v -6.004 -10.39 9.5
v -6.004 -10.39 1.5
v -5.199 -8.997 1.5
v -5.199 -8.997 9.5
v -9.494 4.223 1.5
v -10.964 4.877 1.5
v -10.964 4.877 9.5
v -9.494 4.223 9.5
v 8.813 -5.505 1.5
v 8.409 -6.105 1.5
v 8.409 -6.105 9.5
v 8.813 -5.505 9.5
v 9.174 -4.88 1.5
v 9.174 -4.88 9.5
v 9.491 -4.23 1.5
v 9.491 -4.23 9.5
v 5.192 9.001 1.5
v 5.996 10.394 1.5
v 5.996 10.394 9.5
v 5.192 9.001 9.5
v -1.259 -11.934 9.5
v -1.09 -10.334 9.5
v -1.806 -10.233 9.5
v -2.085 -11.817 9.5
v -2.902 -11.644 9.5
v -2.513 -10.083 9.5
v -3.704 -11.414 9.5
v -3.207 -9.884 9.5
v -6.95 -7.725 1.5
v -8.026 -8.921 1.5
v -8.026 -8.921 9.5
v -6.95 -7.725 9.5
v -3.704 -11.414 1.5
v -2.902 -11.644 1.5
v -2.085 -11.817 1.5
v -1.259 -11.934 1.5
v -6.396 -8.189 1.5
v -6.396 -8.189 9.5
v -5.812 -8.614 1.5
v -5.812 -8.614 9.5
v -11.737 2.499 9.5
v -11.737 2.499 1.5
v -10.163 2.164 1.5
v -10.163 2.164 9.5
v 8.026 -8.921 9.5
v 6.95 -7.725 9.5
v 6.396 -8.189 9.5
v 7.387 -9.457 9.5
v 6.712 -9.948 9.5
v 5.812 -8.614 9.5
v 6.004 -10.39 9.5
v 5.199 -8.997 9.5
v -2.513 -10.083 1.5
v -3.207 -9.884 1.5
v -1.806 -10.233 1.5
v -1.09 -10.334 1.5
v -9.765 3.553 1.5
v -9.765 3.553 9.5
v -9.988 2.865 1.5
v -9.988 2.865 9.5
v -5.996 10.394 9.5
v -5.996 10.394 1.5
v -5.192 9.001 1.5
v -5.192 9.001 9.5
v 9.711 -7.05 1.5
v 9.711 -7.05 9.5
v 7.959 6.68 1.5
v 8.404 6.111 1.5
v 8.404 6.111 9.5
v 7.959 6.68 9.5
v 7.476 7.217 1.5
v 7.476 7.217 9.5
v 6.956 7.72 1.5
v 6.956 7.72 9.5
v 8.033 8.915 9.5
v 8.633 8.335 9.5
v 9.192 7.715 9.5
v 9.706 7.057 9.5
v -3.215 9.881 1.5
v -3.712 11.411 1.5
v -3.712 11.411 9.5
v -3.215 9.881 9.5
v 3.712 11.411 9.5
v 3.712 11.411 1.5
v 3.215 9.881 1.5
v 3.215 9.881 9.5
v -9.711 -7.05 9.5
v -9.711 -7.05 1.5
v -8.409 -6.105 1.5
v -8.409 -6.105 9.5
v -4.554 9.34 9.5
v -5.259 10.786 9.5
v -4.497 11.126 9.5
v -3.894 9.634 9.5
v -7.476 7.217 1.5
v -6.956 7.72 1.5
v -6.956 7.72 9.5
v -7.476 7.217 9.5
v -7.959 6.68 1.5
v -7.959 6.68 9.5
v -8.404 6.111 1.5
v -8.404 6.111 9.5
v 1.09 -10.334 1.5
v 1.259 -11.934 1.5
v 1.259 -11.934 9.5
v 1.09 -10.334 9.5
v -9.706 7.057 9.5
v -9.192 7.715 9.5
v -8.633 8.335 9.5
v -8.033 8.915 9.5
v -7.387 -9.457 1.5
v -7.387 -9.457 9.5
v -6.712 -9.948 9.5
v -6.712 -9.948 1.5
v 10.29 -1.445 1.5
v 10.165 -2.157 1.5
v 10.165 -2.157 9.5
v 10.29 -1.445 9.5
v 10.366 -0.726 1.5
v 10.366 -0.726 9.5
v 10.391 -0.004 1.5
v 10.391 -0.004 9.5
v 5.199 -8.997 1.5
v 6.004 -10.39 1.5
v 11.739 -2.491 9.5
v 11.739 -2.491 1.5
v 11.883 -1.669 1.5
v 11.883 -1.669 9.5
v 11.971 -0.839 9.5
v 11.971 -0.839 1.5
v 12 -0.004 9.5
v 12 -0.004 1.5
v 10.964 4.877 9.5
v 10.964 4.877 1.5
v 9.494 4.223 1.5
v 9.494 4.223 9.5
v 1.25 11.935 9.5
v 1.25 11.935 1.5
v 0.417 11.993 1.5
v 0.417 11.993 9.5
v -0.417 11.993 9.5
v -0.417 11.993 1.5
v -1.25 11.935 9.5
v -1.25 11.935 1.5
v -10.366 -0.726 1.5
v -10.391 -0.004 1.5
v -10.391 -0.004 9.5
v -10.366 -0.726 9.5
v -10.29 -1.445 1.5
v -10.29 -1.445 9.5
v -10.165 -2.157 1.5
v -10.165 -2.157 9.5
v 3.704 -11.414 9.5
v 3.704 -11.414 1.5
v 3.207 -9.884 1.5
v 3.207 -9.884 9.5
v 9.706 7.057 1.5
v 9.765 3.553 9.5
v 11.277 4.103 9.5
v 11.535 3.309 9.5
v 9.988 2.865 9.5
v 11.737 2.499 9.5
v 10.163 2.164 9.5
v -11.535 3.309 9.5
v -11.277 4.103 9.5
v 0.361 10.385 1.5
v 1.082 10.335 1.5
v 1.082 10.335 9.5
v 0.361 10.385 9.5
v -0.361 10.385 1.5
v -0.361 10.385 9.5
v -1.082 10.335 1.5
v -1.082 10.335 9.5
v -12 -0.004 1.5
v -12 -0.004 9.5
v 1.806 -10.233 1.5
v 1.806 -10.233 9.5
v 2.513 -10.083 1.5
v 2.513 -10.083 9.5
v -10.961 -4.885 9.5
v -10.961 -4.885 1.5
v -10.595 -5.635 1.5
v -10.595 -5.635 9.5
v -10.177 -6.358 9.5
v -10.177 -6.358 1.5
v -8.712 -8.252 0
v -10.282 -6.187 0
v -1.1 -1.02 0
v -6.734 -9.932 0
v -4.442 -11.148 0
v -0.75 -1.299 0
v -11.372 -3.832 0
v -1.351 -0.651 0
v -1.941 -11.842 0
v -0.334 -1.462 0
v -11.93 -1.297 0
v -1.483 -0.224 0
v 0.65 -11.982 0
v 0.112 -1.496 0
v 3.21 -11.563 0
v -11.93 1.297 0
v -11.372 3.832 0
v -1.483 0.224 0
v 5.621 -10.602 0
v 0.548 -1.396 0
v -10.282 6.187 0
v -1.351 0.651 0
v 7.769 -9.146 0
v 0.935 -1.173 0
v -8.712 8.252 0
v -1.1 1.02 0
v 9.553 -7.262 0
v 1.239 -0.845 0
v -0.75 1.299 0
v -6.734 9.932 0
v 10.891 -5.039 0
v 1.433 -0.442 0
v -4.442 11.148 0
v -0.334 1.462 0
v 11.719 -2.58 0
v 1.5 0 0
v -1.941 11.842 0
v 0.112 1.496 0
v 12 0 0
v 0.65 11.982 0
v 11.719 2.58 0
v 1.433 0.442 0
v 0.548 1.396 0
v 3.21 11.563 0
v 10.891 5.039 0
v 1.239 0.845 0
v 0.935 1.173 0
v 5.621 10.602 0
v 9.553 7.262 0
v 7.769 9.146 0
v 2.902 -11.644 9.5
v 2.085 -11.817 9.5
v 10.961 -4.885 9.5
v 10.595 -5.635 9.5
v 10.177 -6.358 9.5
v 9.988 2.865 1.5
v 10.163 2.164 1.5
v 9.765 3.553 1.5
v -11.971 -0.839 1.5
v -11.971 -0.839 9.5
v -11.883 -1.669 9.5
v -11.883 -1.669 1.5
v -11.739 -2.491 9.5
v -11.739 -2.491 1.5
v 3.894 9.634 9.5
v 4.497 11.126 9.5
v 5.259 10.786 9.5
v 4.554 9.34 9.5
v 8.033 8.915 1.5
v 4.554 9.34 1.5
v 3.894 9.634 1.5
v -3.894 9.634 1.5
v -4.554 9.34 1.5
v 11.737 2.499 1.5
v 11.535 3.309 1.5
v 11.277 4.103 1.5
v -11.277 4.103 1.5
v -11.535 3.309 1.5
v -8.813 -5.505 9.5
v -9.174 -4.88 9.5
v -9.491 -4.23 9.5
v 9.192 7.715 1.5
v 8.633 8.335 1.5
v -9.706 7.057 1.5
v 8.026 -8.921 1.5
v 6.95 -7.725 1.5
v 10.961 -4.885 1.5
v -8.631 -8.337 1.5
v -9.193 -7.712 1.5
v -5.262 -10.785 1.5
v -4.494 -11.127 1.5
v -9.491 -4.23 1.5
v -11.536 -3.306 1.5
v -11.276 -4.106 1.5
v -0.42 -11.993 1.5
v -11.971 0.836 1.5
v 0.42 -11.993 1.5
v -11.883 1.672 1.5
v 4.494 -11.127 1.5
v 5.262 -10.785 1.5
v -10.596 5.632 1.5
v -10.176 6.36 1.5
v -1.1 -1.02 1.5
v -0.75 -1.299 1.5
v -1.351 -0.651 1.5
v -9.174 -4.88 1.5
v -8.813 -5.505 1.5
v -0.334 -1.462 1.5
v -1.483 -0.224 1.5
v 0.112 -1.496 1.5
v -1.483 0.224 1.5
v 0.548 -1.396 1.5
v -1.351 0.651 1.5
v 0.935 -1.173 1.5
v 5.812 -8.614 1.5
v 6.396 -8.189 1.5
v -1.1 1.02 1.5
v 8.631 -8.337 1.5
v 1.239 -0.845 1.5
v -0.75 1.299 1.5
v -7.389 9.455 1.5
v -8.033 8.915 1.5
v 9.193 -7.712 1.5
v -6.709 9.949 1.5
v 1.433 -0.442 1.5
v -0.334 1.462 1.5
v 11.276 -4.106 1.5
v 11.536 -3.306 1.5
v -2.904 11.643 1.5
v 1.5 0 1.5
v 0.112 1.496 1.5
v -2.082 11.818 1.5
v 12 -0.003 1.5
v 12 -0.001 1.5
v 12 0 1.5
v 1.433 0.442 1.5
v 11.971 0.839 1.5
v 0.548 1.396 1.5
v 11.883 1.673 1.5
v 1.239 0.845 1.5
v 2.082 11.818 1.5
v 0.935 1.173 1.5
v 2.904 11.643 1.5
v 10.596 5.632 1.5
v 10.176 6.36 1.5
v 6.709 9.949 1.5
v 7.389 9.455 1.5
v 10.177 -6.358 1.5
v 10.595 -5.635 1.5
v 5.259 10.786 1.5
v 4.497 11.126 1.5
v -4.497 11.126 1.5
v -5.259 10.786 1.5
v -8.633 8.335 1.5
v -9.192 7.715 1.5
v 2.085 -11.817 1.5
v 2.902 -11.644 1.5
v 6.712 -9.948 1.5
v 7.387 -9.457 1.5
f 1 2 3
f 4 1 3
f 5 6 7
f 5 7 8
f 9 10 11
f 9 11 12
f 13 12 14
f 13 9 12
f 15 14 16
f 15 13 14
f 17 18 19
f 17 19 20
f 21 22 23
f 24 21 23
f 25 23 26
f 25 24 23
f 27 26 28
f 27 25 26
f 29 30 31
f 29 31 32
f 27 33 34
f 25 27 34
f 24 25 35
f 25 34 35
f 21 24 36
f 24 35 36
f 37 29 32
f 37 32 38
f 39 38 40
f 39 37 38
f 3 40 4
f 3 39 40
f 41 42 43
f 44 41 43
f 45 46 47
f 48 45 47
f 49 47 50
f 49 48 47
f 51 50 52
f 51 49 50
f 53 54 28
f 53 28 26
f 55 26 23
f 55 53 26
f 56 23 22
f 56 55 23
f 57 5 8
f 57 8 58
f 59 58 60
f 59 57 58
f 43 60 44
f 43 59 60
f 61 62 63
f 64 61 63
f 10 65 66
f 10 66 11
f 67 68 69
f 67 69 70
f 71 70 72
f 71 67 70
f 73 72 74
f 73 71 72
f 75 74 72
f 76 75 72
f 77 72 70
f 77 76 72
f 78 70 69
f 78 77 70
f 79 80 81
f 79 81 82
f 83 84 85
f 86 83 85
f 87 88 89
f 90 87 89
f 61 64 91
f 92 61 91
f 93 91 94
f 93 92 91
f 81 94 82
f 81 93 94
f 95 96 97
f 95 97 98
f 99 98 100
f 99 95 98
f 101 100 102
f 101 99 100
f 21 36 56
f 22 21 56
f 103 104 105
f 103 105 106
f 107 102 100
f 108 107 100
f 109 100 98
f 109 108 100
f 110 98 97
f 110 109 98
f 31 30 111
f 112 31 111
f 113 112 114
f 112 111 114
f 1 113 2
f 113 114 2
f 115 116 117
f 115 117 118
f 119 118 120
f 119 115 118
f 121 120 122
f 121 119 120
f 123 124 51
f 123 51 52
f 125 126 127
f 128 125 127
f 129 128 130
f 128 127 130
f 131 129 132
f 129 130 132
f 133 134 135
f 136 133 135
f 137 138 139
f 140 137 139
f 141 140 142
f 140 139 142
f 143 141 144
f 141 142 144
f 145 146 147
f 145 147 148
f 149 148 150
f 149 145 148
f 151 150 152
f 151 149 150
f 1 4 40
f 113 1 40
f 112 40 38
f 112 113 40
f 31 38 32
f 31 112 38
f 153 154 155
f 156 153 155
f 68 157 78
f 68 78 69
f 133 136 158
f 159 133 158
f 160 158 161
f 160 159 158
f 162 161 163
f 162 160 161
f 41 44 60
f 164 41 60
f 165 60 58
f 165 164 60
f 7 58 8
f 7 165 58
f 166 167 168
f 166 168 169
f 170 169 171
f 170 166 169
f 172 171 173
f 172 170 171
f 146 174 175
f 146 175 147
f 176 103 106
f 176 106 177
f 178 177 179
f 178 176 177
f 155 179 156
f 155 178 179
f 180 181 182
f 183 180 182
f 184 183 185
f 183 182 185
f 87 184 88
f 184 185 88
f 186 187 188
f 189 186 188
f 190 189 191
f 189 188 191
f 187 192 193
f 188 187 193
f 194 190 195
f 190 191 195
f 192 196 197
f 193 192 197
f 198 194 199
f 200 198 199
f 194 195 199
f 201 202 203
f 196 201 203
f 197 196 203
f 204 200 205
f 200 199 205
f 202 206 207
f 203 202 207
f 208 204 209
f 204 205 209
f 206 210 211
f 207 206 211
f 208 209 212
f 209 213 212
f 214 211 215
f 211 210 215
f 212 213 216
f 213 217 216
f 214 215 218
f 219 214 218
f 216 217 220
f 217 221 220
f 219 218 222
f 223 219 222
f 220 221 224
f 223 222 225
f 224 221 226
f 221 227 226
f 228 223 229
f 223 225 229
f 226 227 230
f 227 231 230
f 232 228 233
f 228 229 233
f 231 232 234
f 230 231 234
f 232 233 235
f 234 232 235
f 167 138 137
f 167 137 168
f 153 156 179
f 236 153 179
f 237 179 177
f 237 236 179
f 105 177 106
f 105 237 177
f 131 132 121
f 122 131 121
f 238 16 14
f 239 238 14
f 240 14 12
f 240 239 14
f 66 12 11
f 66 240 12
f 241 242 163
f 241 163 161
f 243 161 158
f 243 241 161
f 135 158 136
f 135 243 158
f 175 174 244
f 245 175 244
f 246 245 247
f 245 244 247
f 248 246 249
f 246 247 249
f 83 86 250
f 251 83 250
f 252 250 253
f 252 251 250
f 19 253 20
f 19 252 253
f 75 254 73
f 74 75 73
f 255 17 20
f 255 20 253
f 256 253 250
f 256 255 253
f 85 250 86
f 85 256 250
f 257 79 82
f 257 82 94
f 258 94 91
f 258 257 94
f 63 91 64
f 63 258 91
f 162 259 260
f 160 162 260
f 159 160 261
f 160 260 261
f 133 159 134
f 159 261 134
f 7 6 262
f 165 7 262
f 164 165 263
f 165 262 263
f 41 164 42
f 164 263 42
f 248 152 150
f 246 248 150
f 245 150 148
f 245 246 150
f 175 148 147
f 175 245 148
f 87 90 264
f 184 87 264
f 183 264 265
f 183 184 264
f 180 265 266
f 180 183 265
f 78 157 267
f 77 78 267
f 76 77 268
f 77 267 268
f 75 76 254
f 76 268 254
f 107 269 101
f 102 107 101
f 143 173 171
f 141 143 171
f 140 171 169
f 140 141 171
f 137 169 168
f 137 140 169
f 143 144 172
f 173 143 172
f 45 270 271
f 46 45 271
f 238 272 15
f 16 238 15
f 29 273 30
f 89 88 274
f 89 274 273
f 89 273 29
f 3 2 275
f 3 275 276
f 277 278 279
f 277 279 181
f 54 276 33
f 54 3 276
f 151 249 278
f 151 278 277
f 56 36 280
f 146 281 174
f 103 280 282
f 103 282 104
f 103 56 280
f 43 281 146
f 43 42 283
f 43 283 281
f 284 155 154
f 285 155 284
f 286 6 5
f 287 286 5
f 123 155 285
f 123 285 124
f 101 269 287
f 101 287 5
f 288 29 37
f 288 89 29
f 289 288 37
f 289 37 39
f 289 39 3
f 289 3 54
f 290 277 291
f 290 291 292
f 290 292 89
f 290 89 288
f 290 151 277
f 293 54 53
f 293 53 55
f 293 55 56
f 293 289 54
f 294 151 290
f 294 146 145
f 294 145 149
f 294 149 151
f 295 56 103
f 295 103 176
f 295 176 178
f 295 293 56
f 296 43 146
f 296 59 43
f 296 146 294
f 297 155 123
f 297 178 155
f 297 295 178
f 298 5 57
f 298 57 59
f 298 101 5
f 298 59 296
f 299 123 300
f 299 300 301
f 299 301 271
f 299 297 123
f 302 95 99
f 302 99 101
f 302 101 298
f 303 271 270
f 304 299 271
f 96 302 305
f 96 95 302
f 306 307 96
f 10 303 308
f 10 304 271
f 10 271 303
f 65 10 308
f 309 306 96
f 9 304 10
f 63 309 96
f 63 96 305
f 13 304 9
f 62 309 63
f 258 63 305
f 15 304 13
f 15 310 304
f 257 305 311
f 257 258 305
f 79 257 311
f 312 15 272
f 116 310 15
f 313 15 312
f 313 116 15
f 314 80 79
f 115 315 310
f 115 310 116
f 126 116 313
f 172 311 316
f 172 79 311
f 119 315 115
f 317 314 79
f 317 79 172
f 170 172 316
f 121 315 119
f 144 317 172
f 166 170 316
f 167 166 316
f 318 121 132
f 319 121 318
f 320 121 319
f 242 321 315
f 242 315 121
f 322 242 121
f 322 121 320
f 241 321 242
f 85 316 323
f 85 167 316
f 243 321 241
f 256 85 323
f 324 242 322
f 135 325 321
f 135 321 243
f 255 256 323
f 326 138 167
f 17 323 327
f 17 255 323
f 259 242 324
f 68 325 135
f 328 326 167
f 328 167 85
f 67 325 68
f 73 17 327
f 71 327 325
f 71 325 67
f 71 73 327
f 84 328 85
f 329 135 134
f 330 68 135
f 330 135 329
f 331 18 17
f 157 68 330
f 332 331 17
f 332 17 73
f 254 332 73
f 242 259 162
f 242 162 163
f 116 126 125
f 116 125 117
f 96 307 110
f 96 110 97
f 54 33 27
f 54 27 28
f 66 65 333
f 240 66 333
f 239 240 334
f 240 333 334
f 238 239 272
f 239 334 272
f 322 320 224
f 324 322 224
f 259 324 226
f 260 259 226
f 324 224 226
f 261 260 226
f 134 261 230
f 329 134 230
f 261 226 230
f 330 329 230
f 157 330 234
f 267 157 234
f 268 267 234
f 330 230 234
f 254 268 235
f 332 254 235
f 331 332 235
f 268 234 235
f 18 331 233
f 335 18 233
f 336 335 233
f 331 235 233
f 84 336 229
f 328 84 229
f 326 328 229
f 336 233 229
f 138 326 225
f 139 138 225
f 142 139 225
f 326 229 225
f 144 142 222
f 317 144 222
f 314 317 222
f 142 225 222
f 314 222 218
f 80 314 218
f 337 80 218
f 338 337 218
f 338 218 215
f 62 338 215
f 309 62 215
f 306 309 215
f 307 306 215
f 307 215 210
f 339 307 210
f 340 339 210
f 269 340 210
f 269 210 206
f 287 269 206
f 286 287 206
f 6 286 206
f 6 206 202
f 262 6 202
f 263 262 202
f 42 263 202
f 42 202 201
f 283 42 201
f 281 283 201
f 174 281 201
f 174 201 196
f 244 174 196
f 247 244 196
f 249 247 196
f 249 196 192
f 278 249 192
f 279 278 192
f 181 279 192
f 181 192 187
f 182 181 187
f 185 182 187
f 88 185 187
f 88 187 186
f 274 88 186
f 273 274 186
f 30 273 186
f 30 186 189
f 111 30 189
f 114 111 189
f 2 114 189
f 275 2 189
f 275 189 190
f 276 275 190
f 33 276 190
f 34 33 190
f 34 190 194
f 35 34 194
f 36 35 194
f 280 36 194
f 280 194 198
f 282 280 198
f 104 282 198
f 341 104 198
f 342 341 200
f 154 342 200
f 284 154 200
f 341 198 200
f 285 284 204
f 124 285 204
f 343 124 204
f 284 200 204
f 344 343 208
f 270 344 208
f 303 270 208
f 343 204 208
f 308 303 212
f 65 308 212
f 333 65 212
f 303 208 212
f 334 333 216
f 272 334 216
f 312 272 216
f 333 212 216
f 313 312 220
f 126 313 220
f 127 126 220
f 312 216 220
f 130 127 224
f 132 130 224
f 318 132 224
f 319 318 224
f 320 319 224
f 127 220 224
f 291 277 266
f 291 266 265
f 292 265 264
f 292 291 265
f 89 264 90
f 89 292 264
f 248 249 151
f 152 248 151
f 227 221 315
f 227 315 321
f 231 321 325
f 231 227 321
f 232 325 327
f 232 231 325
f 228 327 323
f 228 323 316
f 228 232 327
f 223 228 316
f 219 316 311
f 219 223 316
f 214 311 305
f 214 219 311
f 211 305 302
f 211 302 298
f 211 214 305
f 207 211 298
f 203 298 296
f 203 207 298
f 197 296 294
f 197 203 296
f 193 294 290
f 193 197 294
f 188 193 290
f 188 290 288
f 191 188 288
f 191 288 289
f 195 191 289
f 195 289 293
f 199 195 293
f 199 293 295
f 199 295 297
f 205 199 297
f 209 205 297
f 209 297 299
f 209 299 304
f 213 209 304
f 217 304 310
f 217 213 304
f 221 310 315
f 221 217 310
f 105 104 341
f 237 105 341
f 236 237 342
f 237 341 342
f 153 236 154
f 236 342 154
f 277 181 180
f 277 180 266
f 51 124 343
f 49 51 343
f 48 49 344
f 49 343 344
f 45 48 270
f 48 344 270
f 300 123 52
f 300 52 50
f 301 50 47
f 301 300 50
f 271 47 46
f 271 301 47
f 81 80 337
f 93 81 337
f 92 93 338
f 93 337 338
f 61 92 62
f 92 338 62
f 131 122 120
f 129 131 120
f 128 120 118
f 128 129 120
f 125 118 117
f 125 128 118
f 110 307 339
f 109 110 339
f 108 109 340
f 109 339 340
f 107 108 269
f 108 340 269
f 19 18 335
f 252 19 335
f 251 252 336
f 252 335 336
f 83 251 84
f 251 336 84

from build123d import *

# Parameters (mm, degrees)
SKETCH_R           = 12
SKETCH_R_2         = 1.5
PAD_DEPTH          = 1.5
PAD001_DEPTH       = 8
POLARPATTERN_COUNT = 15


with BuildPart() as part:
    # Sketch → Pad (new body)
    with BuildSketch(Plane.XY):
        Circle(SKETCH_R)
        Circle(SKETCH_R_2, mode=Mode.SUBTRACT)
    extrude(amount=PAD_DEPTH)

    # Sketch001 → Pad001 (new body)
    with BuildSketch(Plane.XY.offset(1.5)):
        with BuildLine():
            ThreePointArc((1.25, 11.934718), (0, 12), (-1.25, 11.934718))
            Line((-1.25, 11.934718), (-1.082422, 10.334718))
            ThreePointArc((1.082422, 10.334718), (0, 10.391248), (-1.082422, 10.334718))
            Line((1.25, 11.934718), (1.082422, 10.334718))
        make_face()
    pad001 = extrude(amount=PAD001_DEPTH)

    # PolarPattern: Pad001 ×15 about axis
    polarpattern_axis = Axis((0, 0, 1.5), (0, 0, 1))
    for i in range(1, POLARPATTERN_COUNT):
        add(pad001.rotate(polarpattern_axis, i * 360 / POLARPATTERN_COUNT))


solid = part.part
